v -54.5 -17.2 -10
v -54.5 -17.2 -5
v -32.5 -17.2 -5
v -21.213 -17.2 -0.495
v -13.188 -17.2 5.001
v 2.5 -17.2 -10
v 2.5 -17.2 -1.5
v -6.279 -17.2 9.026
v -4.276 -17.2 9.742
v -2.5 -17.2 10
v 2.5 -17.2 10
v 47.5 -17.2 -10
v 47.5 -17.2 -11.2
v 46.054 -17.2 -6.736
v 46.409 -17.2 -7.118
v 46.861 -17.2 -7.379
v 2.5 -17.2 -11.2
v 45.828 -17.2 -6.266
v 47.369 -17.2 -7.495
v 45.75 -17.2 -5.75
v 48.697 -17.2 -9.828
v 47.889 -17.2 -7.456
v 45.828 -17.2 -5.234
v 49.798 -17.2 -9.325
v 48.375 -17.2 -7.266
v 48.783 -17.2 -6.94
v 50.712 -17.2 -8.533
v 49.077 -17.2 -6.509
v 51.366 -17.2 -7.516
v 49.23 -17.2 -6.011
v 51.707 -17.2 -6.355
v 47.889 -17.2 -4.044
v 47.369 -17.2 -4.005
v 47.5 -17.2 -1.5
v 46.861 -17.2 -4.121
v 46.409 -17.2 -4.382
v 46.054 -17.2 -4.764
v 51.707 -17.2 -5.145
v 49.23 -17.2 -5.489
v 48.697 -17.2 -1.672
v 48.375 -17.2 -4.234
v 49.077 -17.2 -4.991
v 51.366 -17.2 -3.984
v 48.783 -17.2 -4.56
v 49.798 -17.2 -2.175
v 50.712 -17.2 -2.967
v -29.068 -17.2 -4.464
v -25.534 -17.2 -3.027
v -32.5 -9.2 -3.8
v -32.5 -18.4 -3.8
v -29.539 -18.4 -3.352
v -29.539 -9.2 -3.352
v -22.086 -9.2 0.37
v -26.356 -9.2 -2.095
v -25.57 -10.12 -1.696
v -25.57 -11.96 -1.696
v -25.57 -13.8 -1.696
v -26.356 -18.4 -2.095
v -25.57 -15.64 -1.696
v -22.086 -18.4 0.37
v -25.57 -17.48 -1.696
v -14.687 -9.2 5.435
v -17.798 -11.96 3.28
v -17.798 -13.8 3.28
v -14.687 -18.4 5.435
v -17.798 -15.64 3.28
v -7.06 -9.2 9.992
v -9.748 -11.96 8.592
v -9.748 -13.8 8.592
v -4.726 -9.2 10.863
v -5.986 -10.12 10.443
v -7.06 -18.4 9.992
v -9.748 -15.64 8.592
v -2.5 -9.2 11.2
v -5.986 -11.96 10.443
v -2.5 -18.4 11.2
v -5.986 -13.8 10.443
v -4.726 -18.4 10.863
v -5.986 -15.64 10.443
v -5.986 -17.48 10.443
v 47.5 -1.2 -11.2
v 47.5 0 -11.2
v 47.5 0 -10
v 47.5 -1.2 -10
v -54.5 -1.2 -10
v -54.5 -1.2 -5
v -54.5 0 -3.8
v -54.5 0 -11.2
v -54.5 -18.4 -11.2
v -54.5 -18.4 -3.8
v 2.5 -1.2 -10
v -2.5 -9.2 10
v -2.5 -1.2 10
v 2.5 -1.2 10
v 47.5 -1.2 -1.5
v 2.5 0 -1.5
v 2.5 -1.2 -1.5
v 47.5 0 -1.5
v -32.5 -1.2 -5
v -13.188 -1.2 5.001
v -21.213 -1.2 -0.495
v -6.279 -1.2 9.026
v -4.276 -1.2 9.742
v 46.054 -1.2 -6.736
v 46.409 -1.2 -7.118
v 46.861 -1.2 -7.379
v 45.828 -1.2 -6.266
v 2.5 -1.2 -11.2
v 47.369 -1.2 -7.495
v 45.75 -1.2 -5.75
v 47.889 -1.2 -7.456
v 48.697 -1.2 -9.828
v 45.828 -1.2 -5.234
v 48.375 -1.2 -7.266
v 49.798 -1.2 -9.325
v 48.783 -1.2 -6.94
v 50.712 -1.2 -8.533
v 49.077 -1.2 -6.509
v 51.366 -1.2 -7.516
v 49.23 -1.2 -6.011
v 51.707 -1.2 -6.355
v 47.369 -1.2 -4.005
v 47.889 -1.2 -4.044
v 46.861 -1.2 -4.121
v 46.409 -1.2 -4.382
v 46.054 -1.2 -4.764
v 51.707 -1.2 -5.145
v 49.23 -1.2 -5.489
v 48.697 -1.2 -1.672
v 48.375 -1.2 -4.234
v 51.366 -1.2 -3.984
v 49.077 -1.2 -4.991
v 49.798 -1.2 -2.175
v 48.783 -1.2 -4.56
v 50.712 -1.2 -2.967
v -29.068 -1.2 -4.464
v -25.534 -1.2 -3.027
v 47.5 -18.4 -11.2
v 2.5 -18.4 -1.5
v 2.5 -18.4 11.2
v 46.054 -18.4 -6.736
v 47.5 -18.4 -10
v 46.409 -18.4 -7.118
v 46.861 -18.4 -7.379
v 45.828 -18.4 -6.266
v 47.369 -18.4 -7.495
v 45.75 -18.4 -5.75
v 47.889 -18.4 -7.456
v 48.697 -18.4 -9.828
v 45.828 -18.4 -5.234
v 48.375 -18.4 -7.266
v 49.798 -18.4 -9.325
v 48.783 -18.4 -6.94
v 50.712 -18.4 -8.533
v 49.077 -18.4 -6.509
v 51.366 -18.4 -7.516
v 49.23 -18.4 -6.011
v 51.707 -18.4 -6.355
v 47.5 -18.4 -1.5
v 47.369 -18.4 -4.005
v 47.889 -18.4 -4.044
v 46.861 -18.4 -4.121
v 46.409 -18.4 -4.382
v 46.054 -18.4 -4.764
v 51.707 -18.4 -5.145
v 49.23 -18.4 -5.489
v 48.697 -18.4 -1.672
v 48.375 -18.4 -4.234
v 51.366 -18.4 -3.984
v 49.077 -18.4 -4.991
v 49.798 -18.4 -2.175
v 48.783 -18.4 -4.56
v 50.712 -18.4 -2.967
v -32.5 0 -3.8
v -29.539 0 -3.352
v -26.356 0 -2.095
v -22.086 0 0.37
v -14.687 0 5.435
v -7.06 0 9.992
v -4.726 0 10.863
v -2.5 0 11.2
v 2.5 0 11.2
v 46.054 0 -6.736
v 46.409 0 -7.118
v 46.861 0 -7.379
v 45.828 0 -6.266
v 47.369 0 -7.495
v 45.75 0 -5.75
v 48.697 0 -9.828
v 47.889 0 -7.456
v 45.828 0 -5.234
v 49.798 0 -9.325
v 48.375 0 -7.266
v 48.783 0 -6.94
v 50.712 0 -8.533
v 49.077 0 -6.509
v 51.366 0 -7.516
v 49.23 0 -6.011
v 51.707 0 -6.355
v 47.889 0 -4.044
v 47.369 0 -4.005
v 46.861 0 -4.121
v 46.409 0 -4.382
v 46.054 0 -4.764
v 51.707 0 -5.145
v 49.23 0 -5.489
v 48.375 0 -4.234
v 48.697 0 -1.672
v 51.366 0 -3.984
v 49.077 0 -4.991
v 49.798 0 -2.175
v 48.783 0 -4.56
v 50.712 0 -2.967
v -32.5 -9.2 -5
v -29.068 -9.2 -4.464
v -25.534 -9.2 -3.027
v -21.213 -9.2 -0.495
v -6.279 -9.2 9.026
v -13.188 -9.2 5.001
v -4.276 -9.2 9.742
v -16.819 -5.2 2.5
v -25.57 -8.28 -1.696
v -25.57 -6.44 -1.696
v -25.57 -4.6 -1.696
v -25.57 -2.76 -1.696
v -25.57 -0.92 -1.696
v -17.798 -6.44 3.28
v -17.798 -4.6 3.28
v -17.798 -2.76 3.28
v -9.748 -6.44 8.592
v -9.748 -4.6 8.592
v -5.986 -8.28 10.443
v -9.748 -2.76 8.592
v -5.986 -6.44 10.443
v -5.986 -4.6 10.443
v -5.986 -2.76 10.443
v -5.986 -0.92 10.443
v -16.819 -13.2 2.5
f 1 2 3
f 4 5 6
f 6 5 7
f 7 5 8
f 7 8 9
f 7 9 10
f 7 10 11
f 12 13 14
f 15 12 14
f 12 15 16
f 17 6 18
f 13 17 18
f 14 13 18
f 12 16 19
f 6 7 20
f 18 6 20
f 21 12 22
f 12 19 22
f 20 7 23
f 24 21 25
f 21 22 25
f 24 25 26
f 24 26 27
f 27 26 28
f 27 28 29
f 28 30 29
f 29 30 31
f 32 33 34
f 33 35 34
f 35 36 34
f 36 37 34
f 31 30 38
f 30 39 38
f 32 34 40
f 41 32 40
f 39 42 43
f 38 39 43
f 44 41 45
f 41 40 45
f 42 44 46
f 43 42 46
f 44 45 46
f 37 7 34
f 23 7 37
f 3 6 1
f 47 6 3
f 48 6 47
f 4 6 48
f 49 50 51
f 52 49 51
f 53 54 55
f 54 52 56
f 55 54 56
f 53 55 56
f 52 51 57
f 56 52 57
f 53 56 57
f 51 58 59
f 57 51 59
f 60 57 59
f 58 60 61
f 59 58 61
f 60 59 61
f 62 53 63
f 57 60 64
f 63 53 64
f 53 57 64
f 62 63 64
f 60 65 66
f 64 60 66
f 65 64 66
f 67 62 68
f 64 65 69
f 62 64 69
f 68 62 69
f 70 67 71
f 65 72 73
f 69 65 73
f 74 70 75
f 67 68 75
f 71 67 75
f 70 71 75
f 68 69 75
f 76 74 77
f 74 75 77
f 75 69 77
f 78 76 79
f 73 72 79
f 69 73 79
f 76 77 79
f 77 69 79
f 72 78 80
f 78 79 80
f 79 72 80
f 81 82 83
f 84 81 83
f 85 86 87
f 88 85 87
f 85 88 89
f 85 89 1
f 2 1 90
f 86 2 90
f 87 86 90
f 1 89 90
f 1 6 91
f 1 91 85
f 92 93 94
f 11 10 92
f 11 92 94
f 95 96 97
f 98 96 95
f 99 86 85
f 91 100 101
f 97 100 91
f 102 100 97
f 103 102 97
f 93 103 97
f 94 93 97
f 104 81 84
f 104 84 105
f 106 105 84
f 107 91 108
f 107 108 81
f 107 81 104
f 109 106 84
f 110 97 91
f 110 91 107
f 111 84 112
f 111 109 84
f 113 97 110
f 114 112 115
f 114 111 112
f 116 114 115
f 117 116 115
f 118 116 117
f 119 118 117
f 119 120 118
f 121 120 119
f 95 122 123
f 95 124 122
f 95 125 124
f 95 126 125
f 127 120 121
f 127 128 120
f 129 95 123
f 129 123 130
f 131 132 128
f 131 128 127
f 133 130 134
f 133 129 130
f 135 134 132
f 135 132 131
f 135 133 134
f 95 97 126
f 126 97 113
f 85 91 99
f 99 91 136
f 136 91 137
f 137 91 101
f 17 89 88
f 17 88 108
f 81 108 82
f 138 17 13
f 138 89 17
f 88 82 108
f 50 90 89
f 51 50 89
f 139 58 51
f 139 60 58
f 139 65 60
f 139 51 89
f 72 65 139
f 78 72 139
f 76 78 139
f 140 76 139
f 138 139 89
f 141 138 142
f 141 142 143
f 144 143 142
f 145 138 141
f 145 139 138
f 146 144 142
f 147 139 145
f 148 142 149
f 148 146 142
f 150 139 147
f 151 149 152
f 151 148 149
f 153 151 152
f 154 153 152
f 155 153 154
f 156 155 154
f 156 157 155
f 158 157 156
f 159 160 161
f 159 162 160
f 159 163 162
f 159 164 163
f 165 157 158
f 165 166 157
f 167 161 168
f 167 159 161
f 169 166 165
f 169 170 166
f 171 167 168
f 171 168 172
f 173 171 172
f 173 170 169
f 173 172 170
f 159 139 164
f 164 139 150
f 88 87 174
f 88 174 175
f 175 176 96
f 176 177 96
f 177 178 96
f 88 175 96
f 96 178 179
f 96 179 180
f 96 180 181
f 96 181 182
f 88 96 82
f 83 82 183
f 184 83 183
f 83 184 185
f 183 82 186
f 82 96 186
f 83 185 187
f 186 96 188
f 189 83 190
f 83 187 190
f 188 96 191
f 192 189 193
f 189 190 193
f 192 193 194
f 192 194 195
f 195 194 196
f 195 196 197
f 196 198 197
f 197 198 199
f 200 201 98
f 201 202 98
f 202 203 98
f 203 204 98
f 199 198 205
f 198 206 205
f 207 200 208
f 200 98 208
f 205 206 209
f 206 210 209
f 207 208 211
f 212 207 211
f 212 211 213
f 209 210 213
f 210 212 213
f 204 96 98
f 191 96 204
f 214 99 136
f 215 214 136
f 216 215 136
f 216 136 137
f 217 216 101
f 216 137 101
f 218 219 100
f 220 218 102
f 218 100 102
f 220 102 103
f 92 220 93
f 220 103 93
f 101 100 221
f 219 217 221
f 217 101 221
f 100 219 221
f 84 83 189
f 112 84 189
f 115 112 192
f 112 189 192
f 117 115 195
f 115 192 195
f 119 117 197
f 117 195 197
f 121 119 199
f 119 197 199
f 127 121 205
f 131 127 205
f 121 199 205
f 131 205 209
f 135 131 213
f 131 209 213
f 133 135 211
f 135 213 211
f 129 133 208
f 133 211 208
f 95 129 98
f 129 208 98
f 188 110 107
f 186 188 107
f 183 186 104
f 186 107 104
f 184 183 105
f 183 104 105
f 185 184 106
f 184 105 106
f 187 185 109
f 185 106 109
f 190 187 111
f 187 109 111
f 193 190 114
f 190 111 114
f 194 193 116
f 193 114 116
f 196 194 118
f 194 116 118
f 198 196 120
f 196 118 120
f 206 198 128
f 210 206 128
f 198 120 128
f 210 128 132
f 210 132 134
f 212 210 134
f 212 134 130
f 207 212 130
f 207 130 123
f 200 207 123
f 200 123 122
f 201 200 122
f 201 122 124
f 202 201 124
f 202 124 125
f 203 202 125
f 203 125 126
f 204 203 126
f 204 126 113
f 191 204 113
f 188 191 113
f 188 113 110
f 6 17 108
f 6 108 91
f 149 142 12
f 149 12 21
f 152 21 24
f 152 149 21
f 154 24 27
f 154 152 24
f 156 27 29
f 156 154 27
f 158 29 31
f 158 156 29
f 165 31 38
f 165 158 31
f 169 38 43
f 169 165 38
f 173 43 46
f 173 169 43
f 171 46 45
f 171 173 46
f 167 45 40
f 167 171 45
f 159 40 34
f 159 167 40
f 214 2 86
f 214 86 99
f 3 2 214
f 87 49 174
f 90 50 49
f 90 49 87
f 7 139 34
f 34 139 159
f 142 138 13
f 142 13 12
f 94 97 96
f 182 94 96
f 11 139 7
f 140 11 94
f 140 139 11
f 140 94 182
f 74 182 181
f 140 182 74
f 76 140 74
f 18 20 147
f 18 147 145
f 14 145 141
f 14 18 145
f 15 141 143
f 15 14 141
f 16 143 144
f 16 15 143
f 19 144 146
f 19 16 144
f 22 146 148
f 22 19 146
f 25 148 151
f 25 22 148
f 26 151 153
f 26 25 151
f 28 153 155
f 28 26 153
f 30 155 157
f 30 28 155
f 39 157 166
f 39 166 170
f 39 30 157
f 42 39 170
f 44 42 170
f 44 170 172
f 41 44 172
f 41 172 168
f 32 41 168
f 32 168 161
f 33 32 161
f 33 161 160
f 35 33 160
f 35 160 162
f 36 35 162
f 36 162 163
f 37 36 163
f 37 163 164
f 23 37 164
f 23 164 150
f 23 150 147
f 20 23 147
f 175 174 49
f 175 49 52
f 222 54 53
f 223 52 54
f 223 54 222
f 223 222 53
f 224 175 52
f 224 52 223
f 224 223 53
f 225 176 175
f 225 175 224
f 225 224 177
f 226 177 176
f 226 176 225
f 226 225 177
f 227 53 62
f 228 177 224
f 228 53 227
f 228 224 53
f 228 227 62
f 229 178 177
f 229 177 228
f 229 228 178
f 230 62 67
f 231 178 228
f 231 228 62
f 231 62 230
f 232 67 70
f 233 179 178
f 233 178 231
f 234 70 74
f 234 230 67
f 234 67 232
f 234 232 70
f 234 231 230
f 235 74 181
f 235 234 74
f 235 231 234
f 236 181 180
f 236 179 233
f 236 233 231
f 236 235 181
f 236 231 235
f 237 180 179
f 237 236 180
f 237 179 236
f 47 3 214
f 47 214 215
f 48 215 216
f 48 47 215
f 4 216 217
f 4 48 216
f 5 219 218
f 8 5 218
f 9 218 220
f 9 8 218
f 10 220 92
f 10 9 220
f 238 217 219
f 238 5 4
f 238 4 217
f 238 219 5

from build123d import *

# Parameters (mm, degrees)
F0_W     = 45
F0_H     = 8.5
F0_H_2   = 1.2
F0_W_2   = 22
F0_H_3   = 5
F1_DEPTH = 1.2
F2_DEPTH = 9.2
F3_D     = 3.5


# Not quite as in the source:
# - the dataset's text gives a spline's control points without its knots; the knots are read off the source's solid


with BuildPart() as f1:
    # F0 (on Front) → F1 (new body)
    with BuildSketch(Plane.XZ):
        with BuildLine():
            Line((47.5, -1.5), (47.5, -10))
            ThreePointArc((47.5, -10), (51.75, -5.75), (47.5, -1.5))
        make_face()
        with Locations((25, -5.75)):
            Rectangle(F0_W, F0_H)
        with Locations((25, -10.6)):
            Rectangle(F0_W, F0_H_2)
        with BuildLine():
            Line((-32.5, -10), (-2.5, -10))
            Line((-2.5, -10), (-2.5, 10))
            add(Edge.make_bspline(
                [(-32.5, -5), (-27.5803674012, -5), (-17.2100449751, 2.2275754238), (-6.0579581186, 10), (-2.5, 10)],
                knots=[0, 0, 0, 0, 0.5090778259, 1, 1, 1, 1], degree=3))
            Line((-32.5, -5), (-32.5, -10))
        make_face()
        Polygon((-2.5, -10), (2.5, -10), (2.5, -1.5), (2.5, 10), (-2.5, 10), align=None)
        with Locations((-43.5, -7.5)):
            Rectangle(F0_W_2, F0_H_3)
    extrude(amount=F1_DEPTH)

    # F0 (on Front) → F2 (join)
    with BuildSketch(Plane.XZ):
        with BuildLine():
            add(Edge.make_bspline(
                [(-32.5, -5), (-27.5803674012, -5), (-17.2100449751, 2.2275754238), (-6.0579581186, 10), (-2.5, 10)],
                knots=[0, 0, 0, 0, 0.5090778259, 1, 1, 1, 1], degree=3))
            Line((-2.5, 10), (2.5, 10))
            Line((2.5, 10), (2.5, 11.2))
            Line((2.5, 11.2), (-2.5, 11.2))
            add(Edge.make_bspline(
                [(-32.5, -3.8), (-31.4389363622, -3.8), (-29.2200835852, -3.4091842374), (-25.6037921172, -1.8183804645), (-21.7862624056, 0.5093473763), (-17.819156486, 3.2622809958), (-13.7265020427, 6.1236212623), (-10.3779360475, 8.2729183736), (-7.8194468713, 9.6607467479), (-5.973100675, 10.4877178879), (-4.2025331466, 11.0487112992), (-3.0621946213, 11.2), (-2.5, 11.2)],
                knots=[0, 0, 0, 0, 0.125, 0.25, 0.375, 0.5, 0.625, 0.75, 0.8125, 0.875, 0.9375, 1, 1, 1, 1], degree=3))
            Line((-32.5, -3.8), (-54.5, -3.8))
            Line((-54.5, -3.8), (-54.5, -5))
            Line((-54.5, -5), (-32.5, -5))
        make_face()
        Polygon((2.5, -11.2), (2.5, -10), (-2.5, -10), (-32.5, -10), (-54.5, -10), (-54.5, -11.2), (-32.8350449828, -11.2), (-2.8350449828, -11.2), align=None)
    extrude(amount=F2_DEPTH)

    # F3 (through all)
    with Locations(Plane(origin=(0, 0, 0), x_dir=(1, 0, 0), z_dir=(0, 1, 0))):
        with Locations((47.5, 5.75)):
            Hole(F3_D / 2)

    # F4: F1 across face


with BuildPart() as f1_1:
    add(f1.part)
    add(f1.part.mirror(Plane(origin=(-26, -9.2, -10.6), x_dir=(1, 0, 0), z_dir=(0, -1, 0))))


solid = f1_1.part
